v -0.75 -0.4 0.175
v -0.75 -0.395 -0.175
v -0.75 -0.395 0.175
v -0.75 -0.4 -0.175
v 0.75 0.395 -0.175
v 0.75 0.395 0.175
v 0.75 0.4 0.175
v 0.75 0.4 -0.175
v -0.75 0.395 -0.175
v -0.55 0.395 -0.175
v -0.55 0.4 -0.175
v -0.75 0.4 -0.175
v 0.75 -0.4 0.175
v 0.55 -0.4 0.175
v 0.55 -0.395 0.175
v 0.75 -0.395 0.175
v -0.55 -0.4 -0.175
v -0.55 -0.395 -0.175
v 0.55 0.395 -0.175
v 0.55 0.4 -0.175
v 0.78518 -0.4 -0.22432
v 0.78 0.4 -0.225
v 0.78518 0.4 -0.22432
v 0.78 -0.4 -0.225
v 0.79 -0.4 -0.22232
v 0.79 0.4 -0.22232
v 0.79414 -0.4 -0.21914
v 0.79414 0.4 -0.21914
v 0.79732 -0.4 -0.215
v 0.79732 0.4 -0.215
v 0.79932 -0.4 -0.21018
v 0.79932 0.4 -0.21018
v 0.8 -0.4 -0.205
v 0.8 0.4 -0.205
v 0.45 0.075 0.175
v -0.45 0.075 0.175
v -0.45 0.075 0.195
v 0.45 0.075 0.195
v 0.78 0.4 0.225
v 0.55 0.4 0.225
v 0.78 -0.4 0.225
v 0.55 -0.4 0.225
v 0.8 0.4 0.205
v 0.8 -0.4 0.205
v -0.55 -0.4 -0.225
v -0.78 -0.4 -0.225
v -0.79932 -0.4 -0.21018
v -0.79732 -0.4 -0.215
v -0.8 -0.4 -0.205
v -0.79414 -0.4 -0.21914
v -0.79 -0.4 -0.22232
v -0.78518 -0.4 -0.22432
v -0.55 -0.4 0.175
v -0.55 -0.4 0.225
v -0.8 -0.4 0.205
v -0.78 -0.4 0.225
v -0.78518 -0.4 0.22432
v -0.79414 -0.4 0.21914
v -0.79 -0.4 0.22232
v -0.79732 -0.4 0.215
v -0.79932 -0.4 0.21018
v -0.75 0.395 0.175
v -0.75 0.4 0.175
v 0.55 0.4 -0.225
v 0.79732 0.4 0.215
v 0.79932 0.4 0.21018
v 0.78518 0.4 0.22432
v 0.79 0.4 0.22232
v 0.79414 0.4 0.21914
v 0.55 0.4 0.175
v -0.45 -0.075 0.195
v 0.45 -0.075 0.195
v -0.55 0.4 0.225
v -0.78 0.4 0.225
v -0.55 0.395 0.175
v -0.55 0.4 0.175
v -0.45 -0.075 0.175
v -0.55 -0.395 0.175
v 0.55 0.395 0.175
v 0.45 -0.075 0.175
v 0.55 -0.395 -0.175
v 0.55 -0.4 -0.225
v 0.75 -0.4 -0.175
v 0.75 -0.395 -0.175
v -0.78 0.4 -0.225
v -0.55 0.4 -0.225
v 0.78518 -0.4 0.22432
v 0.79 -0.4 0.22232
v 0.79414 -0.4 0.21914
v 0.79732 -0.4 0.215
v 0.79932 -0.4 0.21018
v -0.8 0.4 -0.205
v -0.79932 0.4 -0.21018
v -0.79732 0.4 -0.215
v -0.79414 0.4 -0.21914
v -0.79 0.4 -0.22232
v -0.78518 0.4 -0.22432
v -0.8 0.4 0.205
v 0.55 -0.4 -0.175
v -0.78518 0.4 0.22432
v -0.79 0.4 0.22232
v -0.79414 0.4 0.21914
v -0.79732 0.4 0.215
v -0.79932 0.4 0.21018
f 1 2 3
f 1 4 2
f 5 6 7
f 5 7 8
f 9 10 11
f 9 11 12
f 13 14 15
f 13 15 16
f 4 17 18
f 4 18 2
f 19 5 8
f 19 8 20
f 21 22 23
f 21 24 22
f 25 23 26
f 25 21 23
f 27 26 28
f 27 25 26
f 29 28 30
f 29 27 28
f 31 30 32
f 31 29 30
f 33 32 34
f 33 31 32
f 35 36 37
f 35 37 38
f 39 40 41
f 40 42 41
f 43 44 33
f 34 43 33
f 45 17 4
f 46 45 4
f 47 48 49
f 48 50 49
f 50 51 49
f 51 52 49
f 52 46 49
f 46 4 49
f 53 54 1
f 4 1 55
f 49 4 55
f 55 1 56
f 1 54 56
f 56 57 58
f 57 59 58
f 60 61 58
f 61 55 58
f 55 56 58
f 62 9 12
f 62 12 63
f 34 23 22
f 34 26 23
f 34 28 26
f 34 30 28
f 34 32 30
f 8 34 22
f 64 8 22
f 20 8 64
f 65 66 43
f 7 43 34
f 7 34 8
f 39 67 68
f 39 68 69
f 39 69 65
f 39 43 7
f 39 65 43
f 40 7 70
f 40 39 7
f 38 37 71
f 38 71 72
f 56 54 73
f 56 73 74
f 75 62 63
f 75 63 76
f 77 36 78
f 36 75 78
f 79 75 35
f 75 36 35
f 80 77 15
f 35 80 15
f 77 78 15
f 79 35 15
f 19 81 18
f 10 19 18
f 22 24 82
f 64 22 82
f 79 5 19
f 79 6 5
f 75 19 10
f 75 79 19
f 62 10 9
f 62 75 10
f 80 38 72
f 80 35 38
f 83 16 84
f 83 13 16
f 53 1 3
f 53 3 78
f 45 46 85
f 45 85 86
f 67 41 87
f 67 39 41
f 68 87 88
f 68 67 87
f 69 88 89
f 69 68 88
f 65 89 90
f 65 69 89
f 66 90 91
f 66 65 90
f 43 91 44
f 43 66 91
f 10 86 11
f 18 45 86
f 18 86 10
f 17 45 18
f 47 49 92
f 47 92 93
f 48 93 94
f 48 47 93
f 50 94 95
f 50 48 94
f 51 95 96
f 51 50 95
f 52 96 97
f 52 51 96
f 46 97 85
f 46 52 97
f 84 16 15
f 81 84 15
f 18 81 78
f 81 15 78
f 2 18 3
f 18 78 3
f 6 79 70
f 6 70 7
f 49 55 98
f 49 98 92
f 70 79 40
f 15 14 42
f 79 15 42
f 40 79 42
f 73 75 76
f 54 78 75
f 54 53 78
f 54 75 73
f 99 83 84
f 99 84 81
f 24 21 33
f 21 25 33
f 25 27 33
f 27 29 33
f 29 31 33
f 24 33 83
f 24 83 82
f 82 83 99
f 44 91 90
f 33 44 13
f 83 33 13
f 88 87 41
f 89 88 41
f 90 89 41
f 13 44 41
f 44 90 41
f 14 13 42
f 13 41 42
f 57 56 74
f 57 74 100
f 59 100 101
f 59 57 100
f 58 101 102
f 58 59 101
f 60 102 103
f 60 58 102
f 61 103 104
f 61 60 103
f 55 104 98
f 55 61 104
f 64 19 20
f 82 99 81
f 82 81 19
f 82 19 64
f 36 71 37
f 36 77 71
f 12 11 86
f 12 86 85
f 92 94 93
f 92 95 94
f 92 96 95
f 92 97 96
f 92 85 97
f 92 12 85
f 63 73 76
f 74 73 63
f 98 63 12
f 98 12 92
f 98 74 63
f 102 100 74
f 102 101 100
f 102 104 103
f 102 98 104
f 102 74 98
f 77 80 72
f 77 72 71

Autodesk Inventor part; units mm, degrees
ref_plane "YZ Plane" through (0, 0, 0) normal (1, 0, 0) x (0, 1, 0)
ref_plane "XZ Plane" through (0, 0, 0) normal (0, 1, 0) x (-1, 0, 0)
ref_plane "XY Plane" through (0, 0, 0) normal (0, 0, 1) x (1, 0, 0)
sketch "Sketch1" plane through (0, 0, 0) normal (0, 1, 0) x (-1, 0, 0)
  line L0 (0.75, 0.175) -> (-0.75, 0.175)
  line L1 (-0.75, 0.175) -> (-0.75, -0.175)
  line L2 (-0.75, -0.175) -> (0.75, -0.175)
  line L3 (0.75, -0.175) -> (0.75, 0.175)
  line L4 (0.55, 0.175) -> (0.55, 0.225)
  line L5 (0.55, 0.225) -> (0.8, 0.225)
  line L6 (0.8, 0.225) -> (0.8, -0.225)
  line L7 (0.8, -0.225) -> (0.55, -0.225)
  line L8 (0.55, -0.225) -> (0.55, -0.175)
  line L9 (-0.55, 0.175) -> (-0.55, 0.225)
  line L10 (-0.55, 0.225) -> (-0.8, 0.225)
  line L11 (-0.8, 0.225) -> (-0.8, -0.225)
  line L12 (-0.8, -0.225) -> (-0.55, -0.225)
  line L13 (-0.55, -0.175) -> (-0.55, -0.225)
  line L14 (0.55, 0.175) -> (-0.55, 0.175)
  point P0 (0, 0)
  point P1 (0, 0.175)
  point P2 (0.75, 0)
  dimension "d0" = 1.6
  dimension "d1" = 0.05
  dimension "d2" = 0.05
  dimension "d3" = 0.45
  dimension "d4" = 0.25
extrude "Extrusion1" add sketch "Sketch1" along normal mid plane 0.8 contours L0 L4 L5 L6 L7 L8 L2 L3 | L0 L1 L2 L13 L12 L11 L10 L9
extrude "Extrusion2" add sketch "Sketch1" along normal mid plane 0.79 contours L3 L2 L1 L0
sketch "Sketch2" plane through (-0.55, -0.395, 0.175) normal (0, 0, 1) x (1, 0, 0)
  line L0 (0, 0) -> (0, 0.79) projected
  line L1 (1.1, 0) -> (0, 0) projected
  line L2 (1.1, 0) -> (1.1, 0.79) projected
  line L3 (0, 0.79) -> (1.1, 0.79) projected
  line L4 (0, 0.395) -> (1.1, 0.395) construction
  line L5 (1, 0.32) -> (0.1, 0.32)
  line L6 (0.1, 0.32) -> (0.1, 0.47)
  line L7 (0.1, 0.47) -> (1, 0.47)
  line L8 (1, 0.47) -> (1, 0.32)
  line L9 (1, 0.32) -> (0.1, 0.47) construction
  line L10 (0.1, 0.32) -> (1, 0.47) construction
  point P0 (0.55, 0.395)
  dimension "d12" = 0.9
  dimension "d13" = 0.15
extrude "Extrusion3" add sketch "Sketch2" along normal blind 0.02 contours L5 L6 L7 L8
fillet "Fillet1" radius 0.02 4 edges at (-0.8, 0, 0.225) (-0.8, 0, -0.225) (0.8, 0, 0.225) (0.8, 0, -0.225)
equation "\"d2\" = d1"
properties part number "21-1001" material "Copper"
